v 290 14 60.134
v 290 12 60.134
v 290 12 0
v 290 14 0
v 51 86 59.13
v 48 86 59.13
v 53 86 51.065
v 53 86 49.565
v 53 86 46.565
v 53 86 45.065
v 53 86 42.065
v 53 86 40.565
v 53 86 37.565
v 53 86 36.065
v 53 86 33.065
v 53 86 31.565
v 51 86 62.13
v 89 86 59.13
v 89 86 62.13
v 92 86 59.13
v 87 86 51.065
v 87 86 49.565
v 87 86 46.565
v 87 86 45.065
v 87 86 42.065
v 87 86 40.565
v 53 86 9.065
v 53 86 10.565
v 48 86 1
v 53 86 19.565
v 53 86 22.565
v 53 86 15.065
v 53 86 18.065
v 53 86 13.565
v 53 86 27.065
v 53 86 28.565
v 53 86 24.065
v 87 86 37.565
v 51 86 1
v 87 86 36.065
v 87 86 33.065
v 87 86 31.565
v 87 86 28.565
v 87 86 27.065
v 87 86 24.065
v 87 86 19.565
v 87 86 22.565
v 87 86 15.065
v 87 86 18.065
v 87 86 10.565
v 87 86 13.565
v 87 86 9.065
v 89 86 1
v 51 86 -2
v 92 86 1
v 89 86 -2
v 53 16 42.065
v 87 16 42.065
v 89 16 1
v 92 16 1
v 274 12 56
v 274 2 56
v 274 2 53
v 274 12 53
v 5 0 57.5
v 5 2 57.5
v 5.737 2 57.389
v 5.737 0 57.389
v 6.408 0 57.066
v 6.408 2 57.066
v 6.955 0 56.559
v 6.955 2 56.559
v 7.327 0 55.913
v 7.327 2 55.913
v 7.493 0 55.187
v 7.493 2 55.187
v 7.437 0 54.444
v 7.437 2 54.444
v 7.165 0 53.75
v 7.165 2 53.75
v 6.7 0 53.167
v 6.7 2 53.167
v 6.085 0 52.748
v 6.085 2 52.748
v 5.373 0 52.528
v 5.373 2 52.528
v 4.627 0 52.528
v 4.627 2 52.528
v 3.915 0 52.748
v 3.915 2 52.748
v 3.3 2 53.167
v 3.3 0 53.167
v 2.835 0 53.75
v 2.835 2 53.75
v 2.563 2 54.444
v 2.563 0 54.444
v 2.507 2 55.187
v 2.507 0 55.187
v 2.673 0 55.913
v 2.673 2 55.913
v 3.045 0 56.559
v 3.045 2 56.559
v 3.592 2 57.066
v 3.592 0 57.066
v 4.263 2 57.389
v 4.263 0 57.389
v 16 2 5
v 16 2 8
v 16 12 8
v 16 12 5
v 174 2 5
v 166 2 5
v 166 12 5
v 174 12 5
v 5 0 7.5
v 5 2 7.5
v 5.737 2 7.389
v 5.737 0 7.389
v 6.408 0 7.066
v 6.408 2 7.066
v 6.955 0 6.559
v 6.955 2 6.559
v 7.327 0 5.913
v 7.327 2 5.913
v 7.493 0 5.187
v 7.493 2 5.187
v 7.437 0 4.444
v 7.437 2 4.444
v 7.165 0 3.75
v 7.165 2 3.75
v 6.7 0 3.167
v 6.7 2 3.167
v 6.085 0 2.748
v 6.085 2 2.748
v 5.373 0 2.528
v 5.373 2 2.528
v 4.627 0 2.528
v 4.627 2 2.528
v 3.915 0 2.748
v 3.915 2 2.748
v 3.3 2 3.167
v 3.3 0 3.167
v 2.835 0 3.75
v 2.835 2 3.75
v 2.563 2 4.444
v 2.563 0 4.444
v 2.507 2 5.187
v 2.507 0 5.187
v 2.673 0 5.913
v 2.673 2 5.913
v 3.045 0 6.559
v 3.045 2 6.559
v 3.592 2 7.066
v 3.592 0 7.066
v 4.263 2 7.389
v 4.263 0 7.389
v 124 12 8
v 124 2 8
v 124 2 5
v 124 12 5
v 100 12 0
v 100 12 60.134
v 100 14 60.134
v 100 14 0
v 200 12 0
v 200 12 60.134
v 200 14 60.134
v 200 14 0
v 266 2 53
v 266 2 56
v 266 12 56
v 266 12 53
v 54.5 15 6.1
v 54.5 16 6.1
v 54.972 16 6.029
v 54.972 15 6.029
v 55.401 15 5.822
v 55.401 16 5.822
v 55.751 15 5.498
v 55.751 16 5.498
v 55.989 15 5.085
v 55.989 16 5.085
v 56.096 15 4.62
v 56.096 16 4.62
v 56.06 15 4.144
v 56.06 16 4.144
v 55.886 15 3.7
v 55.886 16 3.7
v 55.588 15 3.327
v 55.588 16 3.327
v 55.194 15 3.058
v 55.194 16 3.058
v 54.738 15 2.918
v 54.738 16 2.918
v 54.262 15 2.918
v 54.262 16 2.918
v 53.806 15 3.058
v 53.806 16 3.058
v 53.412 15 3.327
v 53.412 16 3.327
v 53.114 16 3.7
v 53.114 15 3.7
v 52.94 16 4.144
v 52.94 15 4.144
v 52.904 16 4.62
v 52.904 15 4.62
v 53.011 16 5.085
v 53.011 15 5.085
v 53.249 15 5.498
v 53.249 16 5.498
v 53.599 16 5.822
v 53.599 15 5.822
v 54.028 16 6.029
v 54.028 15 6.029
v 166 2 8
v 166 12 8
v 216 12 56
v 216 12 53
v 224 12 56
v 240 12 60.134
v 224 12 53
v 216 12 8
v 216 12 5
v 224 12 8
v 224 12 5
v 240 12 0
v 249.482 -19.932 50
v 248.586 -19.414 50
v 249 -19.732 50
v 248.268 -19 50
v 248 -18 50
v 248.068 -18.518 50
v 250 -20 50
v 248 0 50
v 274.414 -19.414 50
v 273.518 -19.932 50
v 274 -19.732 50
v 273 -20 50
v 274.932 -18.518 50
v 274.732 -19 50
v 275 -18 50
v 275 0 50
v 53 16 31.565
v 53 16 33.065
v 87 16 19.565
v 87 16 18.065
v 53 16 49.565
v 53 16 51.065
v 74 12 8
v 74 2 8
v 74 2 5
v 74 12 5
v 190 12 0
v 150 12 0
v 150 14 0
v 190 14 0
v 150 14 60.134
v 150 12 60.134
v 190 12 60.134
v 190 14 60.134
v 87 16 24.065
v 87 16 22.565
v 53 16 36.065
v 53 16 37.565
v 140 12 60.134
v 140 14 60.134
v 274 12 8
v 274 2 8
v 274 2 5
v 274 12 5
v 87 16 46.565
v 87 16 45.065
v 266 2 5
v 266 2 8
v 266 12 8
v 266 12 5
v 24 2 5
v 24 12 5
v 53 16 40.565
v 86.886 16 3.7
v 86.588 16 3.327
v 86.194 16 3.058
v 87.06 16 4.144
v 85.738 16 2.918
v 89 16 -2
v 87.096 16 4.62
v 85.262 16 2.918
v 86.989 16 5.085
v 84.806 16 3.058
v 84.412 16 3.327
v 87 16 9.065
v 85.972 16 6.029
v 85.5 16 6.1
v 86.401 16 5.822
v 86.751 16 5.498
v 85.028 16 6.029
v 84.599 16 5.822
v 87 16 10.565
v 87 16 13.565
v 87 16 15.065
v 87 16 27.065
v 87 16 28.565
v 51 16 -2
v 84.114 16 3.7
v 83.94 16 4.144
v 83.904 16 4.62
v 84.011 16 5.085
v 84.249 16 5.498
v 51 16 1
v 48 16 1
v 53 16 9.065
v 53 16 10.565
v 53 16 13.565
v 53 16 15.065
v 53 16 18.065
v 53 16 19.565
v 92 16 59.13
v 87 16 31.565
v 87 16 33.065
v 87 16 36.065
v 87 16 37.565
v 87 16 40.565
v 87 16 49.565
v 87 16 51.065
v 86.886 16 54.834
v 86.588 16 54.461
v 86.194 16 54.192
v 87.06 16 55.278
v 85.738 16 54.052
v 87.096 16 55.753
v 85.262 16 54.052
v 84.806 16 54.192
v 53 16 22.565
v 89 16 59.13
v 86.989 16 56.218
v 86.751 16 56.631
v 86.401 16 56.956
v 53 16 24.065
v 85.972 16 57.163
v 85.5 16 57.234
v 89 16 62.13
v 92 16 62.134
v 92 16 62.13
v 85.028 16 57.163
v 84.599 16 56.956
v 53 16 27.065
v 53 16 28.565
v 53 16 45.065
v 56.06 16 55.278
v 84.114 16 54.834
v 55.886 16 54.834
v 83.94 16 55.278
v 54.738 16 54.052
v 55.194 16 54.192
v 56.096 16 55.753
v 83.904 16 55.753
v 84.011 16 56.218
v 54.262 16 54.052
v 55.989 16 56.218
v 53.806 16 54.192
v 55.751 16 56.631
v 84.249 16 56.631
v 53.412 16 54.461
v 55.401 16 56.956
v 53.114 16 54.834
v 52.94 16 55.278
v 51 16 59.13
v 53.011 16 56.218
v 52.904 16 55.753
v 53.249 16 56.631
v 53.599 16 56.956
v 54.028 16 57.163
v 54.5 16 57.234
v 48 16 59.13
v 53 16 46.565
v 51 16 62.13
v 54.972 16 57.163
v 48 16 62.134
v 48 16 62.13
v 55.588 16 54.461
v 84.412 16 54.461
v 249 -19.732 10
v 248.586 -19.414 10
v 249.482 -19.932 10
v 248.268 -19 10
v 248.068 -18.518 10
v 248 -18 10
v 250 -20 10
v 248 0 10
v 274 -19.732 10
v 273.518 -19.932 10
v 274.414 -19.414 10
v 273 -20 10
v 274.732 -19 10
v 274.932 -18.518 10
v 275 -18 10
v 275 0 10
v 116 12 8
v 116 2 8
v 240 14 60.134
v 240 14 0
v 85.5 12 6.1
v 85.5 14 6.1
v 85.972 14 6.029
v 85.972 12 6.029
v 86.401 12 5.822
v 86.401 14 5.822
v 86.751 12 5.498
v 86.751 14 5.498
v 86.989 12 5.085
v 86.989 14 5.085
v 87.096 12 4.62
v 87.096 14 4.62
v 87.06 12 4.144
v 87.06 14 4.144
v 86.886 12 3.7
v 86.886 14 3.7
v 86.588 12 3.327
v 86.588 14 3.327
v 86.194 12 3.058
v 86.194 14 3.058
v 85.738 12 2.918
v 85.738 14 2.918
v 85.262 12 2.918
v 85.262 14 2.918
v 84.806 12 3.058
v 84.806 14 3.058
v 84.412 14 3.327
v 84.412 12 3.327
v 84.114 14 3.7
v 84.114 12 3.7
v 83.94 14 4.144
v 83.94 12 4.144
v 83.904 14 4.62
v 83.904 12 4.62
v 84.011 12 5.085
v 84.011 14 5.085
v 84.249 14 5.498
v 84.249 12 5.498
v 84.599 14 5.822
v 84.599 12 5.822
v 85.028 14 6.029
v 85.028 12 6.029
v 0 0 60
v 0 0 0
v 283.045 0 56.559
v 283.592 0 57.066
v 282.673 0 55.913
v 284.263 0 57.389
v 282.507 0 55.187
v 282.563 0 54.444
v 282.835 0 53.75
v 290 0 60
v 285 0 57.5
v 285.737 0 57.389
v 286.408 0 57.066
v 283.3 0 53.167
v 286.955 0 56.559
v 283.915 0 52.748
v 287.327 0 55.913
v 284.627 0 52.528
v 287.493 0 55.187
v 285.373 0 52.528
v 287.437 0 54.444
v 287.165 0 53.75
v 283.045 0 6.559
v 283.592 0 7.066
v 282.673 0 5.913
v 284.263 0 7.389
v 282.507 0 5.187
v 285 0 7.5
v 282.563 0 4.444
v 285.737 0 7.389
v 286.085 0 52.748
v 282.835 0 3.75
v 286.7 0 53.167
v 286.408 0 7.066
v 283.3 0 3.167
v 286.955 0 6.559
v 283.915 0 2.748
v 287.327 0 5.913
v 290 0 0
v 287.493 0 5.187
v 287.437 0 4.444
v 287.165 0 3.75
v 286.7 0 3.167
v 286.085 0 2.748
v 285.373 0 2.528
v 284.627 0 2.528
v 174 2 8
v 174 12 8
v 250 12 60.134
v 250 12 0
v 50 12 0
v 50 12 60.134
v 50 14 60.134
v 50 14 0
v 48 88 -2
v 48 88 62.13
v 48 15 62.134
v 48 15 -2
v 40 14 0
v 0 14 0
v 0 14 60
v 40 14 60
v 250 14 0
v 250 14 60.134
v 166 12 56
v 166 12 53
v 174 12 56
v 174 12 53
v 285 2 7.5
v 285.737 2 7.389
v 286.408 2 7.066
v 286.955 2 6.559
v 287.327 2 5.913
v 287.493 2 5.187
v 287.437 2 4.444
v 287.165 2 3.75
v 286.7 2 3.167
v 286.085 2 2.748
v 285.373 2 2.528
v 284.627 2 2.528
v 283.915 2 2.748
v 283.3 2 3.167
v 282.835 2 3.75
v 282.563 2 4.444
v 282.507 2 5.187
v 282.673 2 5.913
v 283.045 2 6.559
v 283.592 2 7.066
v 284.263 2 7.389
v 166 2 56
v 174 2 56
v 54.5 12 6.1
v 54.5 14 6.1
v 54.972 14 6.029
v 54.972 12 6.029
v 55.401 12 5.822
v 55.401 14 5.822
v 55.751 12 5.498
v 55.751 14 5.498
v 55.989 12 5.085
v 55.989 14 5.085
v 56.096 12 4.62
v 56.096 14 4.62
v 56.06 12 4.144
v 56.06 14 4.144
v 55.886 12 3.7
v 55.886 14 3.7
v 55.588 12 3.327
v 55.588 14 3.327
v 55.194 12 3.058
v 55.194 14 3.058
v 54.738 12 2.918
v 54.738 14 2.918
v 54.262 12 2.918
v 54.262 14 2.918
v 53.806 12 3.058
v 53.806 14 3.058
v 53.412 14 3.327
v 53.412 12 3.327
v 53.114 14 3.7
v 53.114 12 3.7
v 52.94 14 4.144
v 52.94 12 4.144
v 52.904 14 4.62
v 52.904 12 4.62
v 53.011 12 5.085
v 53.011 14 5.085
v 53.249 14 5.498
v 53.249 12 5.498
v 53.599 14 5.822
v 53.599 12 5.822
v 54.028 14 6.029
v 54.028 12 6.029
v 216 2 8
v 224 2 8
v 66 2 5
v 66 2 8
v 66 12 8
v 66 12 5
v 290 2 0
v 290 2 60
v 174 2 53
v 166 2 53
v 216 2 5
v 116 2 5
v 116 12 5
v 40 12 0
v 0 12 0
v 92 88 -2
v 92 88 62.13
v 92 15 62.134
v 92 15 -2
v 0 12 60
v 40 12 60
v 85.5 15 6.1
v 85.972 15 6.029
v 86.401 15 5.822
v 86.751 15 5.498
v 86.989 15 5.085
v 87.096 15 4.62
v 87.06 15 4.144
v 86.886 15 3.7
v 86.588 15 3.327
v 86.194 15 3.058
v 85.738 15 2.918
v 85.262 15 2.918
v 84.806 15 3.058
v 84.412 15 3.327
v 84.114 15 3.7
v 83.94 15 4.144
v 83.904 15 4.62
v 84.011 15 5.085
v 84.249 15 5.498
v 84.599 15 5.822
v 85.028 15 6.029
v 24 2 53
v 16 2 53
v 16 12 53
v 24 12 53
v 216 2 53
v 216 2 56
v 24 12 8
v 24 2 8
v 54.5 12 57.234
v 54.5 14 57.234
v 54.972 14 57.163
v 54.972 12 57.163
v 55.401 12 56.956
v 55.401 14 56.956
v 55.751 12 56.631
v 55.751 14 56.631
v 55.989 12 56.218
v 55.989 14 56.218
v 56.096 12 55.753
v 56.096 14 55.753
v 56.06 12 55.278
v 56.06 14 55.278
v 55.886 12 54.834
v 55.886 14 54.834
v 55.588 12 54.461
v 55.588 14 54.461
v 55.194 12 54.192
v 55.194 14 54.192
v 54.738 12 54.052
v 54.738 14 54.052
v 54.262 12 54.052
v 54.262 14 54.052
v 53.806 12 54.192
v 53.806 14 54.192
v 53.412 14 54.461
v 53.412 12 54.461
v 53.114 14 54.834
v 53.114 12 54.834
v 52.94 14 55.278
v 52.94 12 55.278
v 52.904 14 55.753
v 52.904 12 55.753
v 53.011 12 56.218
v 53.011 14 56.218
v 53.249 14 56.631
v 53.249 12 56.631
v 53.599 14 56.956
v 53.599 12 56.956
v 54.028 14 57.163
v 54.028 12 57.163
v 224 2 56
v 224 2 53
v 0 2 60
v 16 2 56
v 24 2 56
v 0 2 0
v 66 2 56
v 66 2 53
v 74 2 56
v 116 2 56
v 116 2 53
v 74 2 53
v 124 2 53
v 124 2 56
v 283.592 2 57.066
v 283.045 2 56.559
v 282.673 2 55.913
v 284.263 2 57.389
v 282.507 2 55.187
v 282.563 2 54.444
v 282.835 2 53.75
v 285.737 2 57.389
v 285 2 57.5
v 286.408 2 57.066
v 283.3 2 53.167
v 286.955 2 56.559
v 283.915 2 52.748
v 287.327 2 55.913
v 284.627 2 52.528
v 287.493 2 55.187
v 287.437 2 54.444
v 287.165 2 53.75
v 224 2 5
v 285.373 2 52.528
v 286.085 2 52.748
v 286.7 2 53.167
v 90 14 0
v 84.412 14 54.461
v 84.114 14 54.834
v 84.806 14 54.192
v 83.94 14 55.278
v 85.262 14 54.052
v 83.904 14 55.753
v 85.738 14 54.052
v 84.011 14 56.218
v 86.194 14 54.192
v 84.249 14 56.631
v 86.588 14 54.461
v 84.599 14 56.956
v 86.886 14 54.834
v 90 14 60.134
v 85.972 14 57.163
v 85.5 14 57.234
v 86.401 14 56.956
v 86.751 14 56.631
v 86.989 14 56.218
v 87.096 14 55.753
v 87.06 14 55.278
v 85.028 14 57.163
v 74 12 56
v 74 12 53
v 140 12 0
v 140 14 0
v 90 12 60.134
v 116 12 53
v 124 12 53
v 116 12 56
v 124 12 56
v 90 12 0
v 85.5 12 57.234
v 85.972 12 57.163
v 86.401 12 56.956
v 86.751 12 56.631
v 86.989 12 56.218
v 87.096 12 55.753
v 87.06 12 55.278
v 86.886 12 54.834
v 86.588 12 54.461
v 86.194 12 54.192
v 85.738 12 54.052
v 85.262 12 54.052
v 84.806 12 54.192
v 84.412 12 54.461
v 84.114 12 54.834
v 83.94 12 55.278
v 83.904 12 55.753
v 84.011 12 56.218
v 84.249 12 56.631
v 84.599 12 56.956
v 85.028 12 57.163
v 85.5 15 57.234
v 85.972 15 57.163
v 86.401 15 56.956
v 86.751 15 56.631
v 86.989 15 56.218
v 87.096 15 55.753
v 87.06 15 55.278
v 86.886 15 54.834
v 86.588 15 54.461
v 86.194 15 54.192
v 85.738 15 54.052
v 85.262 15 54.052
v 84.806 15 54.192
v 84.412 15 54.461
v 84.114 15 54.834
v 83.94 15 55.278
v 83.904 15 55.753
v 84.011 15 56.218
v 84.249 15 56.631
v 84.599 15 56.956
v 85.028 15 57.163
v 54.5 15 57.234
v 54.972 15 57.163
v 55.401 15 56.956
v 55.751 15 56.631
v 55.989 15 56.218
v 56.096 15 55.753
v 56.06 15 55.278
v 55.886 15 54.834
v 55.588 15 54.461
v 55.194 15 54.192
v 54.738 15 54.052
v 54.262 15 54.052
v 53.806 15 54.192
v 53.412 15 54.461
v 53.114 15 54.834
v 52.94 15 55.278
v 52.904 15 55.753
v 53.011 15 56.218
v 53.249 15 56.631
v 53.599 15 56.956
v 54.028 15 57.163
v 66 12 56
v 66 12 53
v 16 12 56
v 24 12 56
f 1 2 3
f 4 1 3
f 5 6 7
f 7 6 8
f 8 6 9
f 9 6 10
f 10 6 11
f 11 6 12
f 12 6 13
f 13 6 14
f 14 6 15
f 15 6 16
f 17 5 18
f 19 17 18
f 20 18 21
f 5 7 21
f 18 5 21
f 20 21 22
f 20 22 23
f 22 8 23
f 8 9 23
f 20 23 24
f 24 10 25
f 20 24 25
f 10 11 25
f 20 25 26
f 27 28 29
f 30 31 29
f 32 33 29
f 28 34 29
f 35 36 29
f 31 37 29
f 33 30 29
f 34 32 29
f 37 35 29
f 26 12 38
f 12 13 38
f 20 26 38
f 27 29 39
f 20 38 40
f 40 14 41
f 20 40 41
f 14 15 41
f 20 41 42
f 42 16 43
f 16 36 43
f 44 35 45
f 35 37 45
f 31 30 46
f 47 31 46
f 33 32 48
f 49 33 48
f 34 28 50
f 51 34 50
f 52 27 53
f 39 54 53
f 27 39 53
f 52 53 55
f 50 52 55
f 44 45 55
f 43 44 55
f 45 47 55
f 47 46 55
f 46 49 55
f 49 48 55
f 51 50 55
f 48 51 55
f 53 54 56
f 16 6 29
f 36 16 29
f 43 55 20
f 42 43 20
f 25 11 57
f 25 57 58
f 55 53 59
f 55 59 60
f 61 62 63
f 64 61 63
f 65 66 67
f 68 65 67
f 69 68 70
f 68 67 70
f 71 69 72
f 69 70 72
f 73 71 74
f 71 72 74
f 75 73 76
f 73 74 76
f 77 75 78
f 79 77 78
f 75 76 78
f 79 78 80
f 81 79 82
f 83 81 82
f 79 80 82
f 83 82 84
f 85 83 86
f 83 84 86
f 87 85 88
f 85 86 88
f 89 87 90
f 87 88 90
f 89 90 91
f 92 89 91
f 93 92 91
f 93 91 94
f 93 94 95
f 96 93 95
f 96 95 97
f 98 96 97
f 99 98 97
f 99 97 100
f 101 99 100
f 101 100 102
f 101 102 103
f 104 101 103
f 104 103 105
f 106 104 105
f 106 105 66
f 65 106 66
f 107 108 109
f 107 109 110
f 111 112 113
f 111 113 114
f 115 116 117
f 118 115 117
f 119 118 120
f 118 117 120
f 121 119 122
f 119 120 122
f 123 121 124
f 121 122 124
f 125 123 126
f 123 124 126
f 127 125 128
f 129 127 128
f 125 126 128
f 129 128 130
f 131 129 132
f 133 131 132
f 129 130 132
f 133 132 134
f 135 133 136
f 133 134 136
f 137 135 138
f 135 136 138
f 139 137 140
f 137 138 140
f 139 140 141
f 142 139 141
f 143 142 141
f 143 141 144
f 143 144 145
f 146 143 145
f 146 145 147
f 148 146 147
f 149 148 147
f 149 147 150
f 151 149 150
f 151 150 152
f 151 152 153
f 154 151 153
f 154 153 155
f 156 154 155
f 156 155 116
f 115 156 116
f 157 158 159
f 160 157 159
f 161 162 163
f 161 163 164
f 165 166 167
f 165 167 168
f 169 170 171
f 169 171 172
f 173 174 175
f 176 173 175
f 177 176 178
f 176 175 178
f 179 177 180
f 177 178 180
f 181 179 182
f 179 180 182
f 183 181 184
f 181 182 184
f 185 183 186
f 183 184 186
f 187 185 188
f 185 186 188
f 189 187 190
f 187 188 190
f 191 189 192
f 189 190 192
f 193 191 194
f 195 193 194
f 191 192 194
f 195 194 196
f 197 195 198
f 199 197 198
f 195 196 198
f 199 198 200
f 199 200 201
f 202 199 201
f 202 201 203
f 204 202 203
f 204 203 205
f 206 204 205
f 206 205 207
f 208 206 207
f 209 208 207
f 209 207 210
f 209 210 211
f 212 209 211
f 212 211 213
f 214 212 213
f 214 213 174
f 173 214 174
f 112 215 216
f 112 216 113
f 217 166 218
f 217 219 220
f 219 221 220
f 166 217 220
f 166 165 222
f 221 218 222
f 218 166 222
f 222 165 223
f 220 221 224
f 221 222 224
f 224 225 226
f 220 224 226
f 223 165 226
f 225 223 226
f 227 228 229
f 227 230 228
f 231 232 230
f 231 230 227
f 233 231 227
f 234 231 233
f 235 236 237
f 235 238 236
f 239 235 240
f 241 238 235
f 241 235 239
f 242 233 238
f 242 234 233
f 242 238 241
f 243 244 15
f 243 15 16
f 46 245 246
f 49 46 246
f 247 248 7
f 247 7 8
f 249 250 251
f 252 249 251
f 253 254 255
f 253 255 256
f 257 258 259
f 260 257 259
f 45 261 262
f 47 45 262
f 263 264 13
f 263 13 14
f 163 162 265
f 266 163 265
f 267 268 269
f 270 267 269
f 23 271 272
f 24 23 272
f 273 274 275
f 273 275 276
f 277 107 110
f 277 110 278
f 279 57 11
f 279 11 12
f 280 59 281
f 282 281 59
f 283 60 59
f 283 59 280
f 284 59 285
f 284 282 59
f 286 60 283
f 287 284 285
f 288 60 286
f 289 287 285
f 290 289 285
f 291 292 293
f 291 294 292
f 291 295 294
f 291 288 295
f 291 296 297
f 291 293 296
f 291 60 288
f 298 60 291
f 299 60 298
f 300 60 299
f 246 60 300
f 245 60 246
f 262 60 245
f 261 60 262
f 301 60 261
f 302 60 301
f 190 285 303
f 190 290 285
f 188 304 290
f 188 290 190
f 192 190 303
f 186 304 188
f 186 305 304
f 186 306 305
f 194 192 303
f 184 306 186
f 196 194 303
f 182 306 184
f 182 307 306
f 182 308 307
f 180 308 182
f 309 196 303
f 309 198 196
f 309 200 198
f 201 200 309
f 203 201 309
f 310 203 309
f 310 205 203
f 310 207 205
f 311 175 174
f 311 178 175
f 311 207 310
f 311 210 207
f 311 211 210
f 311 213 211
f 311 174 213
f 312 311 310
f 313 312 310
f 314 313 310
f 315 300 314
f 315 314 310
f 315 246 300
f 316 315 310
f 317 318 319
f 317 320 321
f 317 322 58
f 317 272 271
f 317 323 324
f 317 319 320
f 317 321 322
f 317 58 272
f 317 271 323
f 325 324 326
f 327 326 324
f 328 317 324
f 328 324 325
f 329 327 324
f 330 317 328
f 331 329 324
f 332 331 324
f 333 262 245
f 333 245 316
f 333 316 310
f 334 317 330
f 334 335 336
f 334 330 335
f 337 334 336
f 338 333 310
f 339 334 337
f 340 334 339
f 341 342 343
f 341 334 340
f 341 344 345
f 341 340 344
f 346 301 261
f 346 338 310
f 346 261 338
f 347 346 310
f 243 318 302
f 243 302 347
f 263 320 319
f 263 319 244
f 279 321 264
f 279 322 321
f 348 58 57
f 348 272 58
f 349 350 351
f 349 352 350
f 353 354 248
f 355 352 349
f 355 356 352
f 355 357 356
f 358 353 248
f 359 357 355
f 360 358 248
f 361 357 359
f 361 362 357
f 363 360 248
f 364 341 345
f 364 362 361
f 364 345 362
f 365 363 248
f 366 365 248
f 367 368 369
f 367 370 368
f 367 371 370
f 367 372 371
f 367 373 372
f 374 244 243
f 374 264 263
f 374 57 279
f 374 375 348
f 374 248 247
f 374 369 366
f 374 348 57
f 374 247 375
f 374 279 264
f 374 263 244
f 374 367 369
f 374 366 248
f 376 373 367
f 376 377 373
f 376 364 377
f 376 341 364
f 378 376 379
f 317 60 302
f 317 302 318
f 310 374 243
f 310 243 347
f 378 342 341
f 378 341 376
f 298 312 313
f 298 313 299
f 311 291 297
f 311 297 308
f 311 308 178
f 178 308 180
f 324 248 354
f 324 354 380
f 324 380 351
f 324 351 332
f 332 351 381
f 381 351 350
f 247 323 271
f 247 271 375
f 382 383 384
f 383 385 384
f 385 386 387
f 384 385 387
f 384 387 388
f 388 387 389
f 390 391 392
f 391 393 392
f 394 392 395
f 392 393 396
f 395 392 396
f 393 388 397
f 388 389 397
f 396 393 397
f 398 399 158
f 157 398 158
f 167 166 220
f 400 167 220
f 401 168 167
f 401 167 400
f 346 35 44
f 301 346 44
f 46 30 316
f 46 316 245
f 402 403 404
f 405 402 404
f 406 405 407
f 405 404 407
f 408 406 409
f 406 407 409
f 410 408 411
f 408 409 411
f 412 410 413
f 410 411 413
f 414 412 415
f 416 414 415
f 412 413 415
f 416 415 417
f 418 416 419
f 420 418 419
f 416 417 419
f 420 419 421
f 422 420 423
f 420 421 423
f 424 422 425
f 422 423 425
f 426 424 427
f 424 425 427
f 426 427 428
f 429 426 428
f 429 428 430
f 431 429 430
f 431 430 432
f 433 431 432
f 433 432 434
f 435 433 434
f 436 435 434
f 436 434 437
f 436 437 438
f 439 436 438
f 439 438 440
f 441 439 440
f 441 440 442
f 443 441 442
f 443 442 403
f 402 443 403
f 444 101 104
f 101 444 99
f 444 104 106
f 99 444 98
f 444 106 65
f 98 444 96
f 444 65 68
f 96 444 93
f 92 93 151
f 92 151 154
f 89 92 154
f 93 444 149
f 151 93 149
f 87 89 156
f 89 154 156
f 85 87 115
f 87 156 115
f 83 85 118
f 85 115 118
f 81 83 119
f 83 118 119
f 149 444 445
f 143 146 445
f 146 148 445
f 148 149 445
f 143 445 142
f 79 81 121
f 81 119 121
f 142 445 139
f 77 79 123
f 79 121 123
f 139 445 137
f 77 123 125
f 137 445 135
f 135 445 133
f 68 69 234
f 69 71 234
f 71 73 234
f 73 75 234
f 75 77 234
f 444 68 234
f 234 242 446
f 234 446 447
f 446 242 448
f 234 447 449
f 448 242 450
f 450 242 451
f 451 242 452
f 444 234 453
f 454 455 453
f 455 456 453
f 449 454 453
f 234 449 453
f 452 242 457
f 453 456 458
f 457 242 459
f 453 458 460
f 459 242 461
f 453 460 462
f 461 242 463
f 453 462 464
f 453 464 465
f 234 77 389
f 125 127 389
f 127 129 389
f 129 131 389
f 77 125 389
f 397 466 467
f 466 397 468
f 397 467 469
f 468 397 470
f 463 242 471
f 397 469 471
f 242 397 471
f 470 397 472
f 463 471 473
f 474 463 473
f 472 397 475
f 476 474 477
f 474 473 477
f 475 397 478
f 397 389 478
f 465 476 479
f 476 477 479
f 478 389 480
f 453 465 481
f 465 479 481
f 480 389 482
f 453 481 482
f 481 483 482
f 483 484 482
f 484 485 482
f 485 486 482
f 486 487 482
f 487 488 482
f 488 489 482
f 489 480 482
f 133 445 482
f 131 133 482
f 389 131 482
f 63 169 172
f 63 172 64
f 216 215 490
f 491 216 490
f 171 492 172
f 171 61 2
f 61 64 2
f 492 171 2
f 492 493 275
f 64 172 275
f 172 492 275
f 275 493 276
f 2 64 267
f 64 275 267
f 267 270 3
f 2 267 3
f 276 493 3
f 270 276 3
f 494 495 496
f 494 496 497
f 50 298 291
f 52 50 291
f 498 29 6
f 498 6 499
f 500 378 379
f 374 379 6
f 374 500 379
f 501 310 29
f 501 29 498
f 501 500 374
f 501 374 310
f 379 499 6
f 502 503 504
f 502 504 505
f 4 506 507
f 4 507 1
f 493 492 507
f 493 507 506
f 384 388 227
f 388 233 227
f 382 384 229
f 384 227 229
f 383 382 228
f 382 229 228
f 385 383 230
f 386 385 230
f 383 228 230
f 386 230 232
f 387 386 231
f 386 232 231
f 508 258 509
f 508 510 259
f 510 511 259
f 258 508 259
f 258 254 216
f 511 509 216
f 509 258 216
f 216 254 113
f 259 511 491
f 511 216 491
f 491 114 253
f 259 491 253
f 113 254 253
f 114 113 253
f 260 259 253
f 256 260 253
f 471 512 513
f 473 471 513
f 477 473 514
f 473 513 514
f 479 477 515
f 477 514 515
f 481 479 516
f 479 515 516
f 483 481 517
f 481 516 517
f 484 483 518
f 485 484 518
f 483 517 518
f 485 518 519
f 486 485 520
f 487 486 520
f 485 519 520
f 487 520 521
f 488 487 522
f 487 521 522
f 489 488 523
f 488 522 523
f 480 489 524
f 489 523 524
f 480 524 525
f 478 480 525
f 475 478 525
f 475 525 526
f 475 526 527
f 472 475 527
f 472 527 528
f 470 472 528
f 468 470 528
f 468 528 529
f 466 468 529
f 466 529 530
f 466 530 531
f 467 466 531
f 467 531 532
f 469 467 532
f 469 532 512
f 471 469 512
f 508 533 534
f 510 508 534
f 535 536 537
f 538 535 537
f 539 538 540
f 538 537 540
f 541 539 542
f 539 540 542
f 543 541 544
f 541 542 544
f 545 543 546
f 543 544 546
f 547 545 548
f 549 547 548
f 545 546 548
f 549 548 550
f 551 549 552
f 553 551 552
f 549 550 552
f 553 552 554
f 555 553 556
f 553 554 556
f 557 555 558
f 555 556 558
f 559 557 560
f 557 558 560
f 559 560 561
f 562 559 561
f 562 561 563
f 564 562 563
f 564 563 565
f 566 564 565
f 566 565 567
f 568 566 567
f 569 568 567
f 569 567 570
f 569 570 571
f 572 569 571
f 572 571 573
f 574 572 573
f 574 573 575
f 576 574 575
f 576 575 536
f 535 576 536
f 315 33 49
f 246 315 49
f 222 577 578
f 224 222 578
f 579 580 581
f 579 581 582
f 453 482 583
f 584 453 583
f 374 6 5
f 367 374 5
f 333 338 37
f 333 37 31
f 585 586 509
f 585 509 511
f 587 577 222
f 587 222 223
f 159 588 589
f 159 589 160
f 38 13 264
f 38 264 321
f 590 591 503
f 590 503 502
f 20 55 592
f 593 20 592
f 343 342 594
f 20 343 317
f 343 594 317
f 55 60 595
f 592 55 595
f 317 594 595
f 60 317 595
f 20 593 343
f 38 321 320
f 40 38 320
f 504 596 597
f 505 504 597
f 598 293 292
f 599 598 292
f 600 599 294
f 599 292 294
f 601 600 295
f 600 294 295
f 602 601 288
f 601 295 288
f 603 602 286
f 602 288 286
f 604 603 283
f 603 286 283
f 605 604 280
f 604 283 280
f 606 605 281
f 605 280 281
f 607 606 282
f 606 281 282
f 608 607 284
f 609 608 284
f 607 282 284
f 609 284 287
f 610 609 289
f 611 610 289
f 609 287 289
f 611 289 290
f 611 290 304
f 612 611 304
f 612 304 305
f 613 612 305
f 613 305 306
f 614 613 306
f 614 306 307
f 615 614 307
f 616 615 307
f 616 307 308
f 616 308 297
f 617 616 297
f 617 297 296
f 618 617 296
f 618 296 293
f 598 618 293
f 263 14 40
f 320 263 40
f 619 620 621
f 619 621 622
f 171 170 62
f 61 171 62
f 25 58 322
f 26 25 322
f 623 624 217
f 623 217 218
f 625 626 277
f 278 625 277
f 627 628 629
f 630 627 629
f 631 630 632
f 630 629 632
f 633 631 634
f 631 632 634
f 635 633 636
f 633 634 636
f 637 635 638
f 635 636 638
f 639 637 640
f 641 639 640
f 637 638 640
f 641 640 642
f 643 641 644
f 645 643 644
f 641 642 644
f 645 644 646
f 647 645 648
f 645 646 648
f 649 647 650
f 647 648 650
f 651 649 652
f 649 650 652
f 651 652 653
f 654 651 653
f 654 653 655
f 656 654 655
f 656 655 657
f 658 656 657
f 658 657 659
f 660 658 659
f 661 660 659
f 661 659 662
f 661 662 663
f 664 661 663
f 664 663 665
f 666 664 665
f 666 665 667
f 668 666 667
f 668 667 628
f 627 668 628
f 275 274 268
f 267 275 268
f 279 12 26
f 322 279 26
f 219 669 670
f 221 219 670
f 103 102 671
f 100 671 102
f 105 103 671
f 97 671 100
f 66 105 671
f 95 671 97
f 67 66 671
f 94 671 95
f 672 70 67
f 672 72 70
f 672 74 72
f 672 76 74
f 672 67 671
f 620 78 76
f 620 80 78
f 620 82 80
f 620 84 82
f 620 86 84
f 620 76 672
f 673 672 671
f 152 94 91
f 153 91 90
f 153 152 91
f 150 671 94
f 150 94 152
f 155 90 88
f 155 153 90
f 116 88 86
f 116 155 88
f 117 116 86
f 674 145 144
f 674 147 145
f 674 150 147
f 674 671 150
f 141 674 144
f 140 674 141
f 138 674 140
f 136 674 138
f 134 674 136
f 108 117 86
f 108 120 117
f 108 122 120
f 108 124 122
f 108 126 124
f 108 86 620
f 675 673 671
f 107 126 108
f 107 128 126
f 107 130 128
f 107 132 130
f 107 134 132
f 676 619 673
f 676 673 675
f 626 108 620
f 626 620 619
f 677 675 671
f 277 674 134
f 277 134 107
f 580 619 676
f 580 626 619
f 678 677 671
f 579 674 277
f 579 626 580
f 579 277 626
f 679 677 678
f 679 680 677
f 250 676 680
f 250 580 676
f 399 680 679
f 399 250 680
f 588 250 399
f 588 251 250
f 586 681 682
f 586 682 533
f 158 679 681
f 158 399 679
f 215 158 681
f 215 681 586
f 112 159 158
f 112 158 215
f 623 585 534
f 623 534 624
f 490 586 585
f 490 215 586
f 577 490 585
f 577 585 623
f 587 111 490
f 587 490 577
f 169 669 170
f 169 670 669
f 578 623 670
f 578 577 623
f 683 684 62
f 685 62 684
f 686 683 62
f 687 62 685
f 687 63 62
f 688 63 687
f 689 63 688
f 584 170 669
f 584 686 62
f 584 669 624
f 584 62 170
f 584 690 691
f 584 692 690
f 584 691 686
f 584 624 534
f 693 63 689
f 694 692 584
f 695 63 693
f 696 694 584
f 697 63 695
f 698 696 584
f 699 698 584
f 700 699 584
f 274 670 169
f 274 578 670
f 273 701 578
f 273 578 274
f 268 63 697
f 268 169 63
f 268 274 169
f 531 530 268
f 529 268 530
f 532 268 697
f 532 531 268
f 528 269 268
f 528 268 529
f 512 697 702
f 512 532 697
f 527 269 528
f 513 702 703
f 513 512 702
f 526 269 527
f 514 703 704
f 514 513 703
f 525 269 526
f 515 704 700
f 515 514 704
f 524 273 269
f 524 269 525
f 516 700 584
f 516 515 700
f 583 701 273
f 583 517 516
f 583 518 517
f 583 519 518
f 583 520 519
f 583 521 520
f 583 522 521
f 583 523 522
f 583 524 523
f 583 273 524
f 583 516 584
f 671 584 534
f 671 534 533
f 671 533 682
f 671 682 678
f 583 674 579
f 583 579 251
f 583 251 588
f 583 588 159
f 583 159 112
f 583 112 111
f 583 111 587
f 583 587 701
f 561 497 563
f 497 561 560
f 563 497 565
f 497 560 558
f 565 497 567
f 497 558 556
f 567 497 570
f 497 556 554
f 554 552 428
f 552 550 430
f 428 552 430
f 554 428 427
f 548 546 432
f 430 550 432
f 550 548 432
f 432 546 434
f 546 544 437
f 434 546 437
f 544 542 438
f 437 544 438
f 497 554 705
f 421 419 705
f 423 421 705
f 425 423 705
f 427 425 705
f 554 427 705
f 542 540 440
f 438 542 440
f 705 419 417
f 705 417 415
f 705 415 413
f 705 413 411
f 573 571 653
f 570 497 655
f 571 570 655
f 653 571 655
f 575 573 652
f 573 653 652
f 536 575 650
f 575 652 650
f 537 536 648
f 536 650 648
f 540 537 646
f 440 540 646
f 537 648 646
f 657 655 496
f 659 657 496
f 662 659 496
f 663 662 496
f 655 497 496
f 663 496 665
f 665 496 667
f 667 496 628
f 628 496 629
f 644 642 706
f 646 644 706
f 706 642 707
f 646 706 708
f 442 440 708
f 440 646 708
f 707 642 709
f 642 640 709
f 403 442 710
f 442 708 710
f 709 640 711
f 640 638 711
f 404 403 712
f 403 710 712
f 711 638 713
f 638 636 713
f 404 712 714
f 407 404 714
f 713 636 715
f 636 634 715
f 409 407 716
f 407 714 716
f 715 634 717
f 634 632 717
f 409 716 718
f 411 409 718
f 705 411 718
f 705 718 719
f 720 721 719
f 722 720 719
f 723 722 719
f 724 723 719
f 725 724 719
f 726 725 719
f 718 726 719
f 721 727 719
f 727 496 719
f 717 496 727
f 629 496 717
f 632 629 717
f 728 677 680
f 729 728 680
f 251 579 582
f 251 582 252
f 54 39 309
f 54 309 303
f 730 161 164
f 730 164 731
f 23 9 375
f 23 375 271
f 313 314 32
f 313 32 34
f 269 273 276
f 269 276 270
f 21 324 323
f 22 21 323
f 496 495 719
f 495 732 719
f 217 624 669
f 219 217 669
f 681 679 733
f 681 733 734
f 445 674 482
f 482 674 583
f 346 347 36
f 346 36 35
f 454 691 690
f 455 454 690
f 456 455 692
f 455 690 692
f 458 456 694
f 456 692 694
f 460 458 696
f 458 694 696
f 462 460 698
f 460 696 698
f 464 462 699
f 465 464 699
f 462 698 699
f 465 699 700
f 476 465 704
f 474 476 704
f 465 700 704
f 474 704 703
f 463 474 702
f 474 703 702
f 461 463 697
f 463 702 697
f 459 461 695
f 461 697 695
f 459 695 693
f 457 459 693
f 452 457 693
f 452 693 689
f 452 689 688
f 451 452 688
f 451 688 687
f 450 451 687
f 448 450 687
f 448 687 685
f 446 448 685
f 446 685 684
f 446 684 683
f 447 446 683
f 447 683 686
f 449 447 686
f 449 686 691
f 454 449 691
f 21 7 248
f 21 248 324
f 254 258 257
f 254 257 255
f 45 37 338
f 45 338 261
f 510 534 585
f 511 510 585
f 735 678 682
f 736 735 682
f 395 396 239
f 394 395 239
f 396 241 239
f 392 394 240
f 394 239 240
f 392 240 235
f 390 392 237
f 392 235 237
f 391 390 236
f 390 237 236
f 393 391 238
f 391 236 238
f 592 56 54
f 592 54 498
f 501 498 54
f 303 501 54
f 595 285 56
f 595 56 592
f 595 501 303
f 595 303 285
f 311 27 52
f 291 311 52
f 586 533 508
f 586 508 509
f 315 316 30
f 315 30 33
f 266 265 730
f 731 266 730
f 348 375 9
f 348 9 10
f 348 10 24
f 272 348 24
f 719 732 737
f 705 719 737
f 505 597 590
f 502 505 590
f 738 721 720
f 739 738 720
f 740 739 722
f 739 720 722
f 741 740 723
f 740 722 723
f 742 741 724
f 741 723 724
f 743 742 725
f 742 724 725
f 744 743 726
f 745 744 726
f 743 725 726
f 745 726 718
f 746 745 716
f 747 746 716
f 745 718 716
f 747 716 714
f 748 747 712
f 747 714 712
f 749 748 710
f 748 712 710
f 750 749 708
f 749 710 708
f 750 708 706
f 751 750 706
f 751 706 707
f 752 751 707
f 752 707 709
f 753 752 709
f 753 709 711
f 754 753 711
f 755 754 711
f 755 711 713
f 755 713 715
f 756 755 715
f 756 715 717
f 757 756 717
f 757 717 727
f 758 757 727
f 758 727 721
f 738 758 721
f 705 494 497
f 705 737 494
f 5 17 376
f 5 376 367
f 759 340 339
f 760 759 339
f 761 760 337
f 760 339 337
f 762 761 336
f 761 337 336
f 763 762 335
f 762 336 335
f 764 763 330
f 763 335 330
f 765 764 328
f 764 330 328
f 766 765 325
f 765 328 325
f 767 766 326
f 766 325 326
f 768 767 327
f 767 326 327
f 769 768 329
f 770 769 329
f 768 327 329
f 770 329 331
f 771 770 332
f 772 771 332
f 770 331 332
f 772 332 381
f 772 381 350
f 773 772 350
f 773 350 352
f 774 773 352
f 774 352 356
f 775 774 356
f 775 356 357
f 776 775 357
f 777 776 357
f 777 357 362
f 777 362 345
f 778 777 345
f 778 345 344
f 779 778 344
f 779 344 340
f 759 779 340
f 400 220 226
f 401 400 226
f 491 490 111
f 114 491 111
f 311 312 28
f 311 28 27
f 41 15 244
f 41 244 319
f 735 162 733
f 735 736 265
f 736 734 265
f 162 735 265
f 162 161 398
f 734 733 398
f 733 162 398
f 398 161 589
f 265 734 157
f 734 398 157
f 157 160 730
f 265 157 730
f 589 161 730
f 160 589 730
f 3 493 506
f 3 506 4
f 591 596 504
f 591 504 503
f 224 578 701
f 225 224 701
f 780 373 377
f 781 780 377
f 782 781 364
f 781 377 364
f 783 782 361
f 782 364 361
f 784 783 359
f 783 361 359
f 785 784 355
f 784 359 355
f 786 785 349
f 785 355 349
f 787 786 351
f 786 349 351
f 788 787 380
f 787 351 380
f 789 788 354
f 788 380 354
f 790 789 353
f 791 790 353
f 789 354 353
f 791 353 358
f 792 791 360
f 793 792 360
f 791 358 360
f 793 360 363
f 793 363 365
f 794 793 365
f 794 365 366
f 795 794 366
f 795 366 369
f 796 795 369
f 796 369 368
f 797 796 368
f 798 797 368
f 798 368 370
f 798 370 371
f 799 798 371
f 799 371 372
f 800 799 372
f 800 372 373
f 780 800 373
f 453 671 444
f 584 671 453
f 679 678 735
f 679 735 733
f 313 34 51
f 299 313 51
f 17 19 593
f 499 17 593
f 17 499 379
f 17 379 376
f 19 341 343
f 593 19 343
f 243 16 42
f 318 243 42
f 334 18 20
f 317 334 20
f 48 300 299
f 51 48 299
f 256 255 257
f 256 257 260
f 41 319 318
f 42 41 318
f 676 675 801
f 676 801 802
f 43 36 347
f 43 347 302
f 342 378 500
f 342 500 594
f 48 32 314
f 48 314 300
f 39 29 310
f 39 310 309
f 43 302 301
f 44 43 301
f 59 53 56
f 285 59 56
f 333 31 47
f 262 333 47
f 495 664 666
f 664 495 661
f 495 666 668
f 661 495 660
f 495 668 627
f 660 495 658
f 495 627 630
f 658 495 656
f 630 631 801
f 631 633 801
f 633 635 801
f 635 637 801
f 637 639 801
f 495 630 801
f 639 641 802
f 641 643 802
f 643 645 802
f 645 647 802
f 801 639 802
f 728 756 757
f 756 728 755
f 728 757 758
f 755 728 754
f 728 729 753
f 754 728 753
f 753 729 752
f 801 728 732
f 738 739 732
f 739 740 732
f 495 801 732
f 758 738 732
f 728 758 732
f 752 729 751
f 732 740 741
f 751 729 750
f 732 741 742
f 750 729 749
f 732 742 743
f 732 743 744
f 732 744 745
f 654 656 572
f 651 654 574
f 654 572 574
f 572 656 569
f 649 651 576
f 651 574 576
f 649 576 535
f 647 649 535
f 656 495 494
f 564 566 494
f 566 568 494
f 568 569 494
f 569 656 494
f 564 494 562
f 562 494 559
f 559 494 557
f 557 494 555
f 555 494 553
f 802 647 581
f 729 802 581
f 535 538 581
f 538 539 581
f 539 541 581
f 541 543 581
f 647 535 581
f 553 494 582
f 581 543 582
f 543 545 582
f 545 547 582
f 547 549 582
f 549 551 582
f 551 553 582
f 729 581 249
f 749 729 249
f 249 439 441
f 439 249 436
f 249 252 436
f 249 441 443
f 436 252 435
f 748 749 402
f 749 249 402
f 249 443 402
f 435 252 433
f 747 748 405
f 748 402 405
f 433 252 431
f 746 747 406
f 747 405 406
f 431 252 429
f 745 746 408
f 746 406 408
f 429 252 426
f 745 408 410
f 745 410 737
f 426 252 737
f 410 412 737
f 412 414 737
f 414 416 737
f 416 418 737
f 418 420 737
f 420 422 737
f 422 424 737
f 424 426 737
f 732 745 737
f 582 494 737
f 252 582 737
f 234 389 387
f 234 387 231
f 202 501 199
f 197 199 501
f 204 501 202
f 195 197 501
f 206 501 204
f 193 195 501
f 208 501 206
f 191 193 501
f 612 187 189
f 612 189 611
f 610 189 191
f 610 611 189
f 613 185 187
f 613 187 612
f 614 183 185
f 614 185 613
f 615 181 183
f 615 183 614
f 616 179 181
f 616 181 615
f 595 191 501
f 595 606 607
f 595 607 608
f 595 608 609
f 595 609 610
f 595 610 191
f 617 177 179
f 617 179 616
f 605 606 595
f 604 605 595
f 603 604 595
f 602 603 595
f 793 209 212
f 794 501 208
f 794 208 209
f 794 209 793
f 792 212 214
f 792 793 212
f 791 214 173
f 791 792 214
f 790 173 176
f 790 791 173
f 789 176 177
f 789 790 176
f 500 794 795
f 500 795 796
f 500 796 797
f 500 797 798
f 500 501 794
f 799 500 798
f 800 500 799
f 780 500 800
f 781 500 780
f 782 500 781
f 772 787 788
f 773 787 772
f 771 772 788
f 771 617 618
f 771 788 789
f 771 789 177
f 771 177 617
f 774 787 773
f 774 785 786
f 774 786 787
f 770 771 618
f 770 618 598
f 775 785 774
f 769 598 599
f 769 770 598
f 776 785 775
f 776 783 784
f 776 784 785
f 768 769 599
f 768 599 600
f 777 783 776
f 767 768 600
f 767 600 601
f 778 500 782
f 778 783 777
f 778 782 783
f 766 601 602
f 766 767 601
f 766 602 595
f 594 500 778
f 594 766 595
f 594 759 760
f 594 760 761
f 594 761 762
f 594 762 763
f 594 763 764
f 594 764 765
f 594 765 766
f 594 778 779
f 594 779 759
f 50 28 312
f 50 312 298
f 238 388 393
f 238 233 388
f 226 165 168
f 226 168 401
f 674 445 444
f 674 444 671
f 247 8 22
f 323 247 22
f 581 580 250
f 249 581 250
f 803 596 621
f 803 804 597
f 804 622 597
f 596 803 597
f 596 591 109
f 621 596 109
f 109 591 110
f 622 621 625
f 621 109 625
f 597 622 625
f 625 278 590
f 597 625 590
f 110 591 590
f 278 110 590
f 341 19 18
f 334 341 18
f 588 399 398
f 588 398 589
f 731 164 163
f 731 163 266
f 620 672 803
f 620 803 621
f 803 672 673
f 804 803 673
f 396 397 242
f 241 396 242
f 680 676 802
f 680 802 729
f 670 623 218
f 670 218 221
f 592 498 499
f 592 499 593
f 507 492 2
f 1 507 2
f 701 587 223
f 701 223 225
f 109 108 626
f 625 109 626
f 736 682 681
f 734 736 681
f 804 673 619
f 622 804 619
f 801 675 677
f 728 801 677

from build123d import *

# Parameters (mm, degrees)
SKIZZE1_W                        = 290
SKIZZE1_H                        = 2
AUFSATZ_LINEAR_AUSTRAGEN1_DEPTH  = 60
SKIZZE2_R                        = 2.5
SCHNITT_LINEAR_AUSTRAGEN1_DEPTH  = 60
SKIZZE3_W                        = 8
SKIZZE3_H                        = 3
AUFSATZ_LINEAR_AUSTRAGEN2_DEPTH  = 10
SKIZZE4_W                        = 40
SKIZZE4_H                        = 60
SKIZZE4_H_2                      = 60.133820733
AUFSATZ_LINEAR_AUSTRAGEN3_DEPTH  = 2
SKIZZE6_W                        = 40
SKIZZE6_H                        = 60.133820733
AUFSATZ_LINEAR_AUSTRAGEN4_DEPTH  = 2
SKIZZE7_W                        = 60.133820733
SKIZZE7_H                        = 2
AUFSATZ_LINEAR_AUSTRAGEN5_DEPTH  = 2
SKIZZE8_W                        = 60.133820733
SKIZZE8_H                        = 2
AUFSATZ_LINEAR_AUSTRAGEN6_DEPTH  = 2
SKIZZE9_W                        = 44
SKIZZE9_H                        = 2
AUFSATZ_LINEAR_AUSTRAGEN7_DEPTH  = 2
SKIZZE10_W                       = 44
SKIZZE10_H                       = 2
AUFSATZ_LINEAR_AUSTRAGEN8_DEPTH  = 2
SKIZZE11_W                       = 34
SKIZZE11_H                       = 1.5
AUFSATZ_LINEAR_AUSTRAGEN9_DEPTH  = 70
SKIZZE12_W                       = 44
SKIZZE12_H                       = 1
SCHNITT_LINEAR_AUSTRAGEN3_DEPTH  = 70
SKIZZE13_W                       = 44
SKIZZE13_H                       = 64.13
AUFSATZ_LINEAR_AUSTRAGEN10_DEPTH = 2
SKIZZE14_W                       = 3
SKIZZE14_H                       = 3
AUFSATZ_LINEAR_AUSTRAGEN11_DEPTH = 72
SKIZZE15_W                       = 27
SKIZZE15_H                       = 40
AUFSATZ_LINEAR_AUSTRAGEN12_DEPTH = 20
VERRUNDUNG2_R                    = 2
VERRUNDUNG3_R                    = 2
SKIZZE18_R                       = 1.6
SCHNITT_LINEAR_AUSTRAGEN4_DEPTH  = 10


with BuildPart() as part:
    # Skizze1 → Aufsatz-Linear austragen1 (new body)
    with BuildSketch(Plane.XY):
        with Locations((145, 1)):
            Rectangle(SKIZZE1_W, SKIZZE1_H)
    extrude(amount=AUFSATZ_LINEAR_AUSTRAGEN1_DEPTH)

    # Skizze2 → Schnitt-Linear austragen1 (cut)
    with BuildSketch(Plane(origin=(0, 2, 0), x_dir=(1, 0, 0), z_dir=(0, 1, 0))):
        with Locations(Location((5, -5, 0), (0, 0, 270))):
            Circle(SKIZZE2_R)
        with Locations(Location((5, -55, 0), (0, 0, 270))):
            Circle(SKIZZE2_R)
        with Locations(Location((285, -55, 0), (0, 0, 270))):
            Circle(SKIZZE2_R)
        with Locations(Location((285, -5, 0), (0, 0, 270))):
            Circle(SKIZZE2_R)
    extrude(amount=-SCHNITT_LINEAR_AUSTRAGEN1_DEPTH, mode=Mode.SUBTRACT)

    # Skizze3 → Aufsatz-Linear austragen2 (add)
    with BuildSketch(Plane(origin=(0, 2, 0), x_dir=(1, 0, 0), z_dir=(0, 1, 0))):
        with Locations((20, -6.5)):
            Rectangle(SKIZZE3_W, SKIZZE3_H)
        with Locations((70, -6.5)):
            Rectangle(SKIZZE3_W, SKIZZE3_H)
        with Locations((120, -6.5)):
            Rectangle(SKIZZE3_W, SKIZZE3_H)
        with Locations((170, -6.5)):
            Rectangle(SKIZZE3_W, SKIZZE3_H)
        with Locations((220, -6.5)):
            Rectangle(SKIZZE3_W, SKIZZE3_H)
        with Locations((270, -6.5)):
            Rectangle(SKIZZE3_W, SKIZZE3_H)
        with Locations((270, -54.5)):
            Rectangle(SKIZZE3_W, SKIZZE3_H)
        with Locations((220, -54.5)):
            Rectangle(SKIZZE3_W, SKIZZE3_H)
        with Locations((170, -54.5)):
            Rectangle(SKIZZE3_W, SKIZZE3_H)
        with Locations((120, -54.5)):
            Rectangle(SKIZZE3_W, SKIZZE3_H)
        with Locations((70, -54.5)):
            Rectangle(SKIZZE3_W, SKIZZE3_H)
        with Locations((20, -54.5)):
            Rectangle(SKIZZE3_W, SKIZZE3_H)
    extrude(amount=AUFSATZ_LINEAR_AUSTRAGEN2_DEPTH)

    # Skizze4 → Aufsatz-Linear austragen3 (add)
    with BuildSketch(Plane(origin=(0, 12, 0), x_dir=(1, 0, 0), z_dir=(0, 1, 0))):
        with Locations((20, -30)):
            Rectangle(SKIZZE4_W, SKIZZE4_H)
        with Locations((70, -30.066910367)):
            Rectangle(SKIZZE4_W, SKIZZE4_H_2)
        with Locations((120, -30.066910367)):
            Rectangle(SKIZZE4_W, SKIZZE4_H_2)
        with Locations((170, -30.066910367)):
            Rectangle(SKIZZE4_W, SKIZZE4_H_2)
        with Locations((220, -30.066910367)):
            Rectangle(SKIZZE4_W, SKIZZE4_H_2)
        with Locations((270, -30.066910367)):
            Rectangle(SKIZZE4_W, SKIZZE4_H_2)
    extrude(amount=AUFSATZ_LINEAR_AUSTRAGEN3_DEPTH)

    # Skizze6 → Aufsatz-Linear austragen4 (add)
    with BuildSketch(Plane(origin=(0, 14, 0), x_dir=(1, 0, 0), z_dir=(0, 1, 0))):
        with Locations((70, -30.066910367)):
            Rectangle(SKIZZE6_W, SKIZZE6_H)
    extrude(amount=AUFSATZ_LINEAR_AUSTRAGEN4_DEPTH)

    # Skizze7 → Aufsatz-Linear austragen5 (add)
    with BuildSketch(Plane(origin=(90, 0, 0), x_dir=(0, 0, -1), z_dir=(1, 0, 0))):
        with Locations((-30.066910367, 15)):
            Rectangle(SKIZZE7_W, SKIZZE7_H)
    extrude(amount=AUFSATZ_LINEAR_AUSTRAGEN5_DEPTH)

    # Skizze8 → Aufsatz-Linear austragen6 (add)
    with BuildSketch(Plane.ZY.offset(-50)):
        with Locations((30.066910367, 15)):
            Rectangle(SKIZZE8_W, SKIZZE8_H)
    extrude(amount=AUFSATZ_LINEAR_AUSTRAGEN6_DEPTH)

    # Skizze9 → Aufsatz-Linear austragen7 (add)
    with BuildSketch(Plane.XY.offset(60.133820733)):
        with Locations((70, 15)):
            Rectangle(SKIZZE9_W, SKIZZE9_H)
    extrude(amount=AUFSATZ_LINEAR_AUSTRAGEN7_DEPTH)

    # Skizze10 → Aufsatz-Linear austragen8 (add)
    with BuildSketch(Plane(origin=(0, 0, 0), x_dir=(-1, 0, 0), z_dir=(0, 0, -1))):
        with Locations((-70, 15)):
            Rectangle(SKIZZE10_W, SKIZZE10_H)
    extrude(amount=AUFSATZ_LINEAR_AUSTRAGEN8_DEPTH)

    # Skizze11 → Aufsatz-Linear austragen9 (add)
    with BuildSketch(Plane(origin=(0, 16, 0), x_dir=(1, 0, 0), z_dir=(0, 1, 0))):
        with Locations((70, -9.815)):
            Rectangle(SKIZZE11_W, SKIZZE11_H)
        with Locations((70, -14.315)):
            Rectangle(SKIZZE11_W, SKIZZE11_H)
        with Locations((70, -18.815)):
            Rectangle(SKIZZE11_W, SKIZZE11_H)
        with Locations((70, -23.315)):
            Rectangle(SKIZZE11_W, SKIZZE11_H)
        with Locations((70, -27.815)):
            Rectangle(SKIZZE11_W, SKIZZE11_H)
        with Locations((70, -32.315)):
            Rectangle(SKIZZE11_W, SKIZZE11_H)
        with Locations((70, -36.815)):
            Rectangle(SKIZZE11_W, SKIZZE11_H)
        with Locations((70, -41.315)):
            Rectangle(SKIZZE11_W, SKIZZE11_H)
        with Locations((70, -45.815)):
            Rectangle(SKIZZE11_W, SKIZZE11_H)
        with Locations((70, -50.315)):
            Rectangle(SKIZZE11_W, SKIZZE11_H)
    extrude(amount=AUFSATZ_LINEAR_AUSTRAGEN9_DEPTH)

    # Skizze12 → Schnitt-Linear austragen3 (cut)
    with BuildSketch(Plane.XY.offset(62.133820733)):
        with Locations((70, 14.5)):
            Rectangle(SKIZZE12_W, SKIZZE12_H)
    extrude(amount=-SCHNITT_LINEAR_AUSTRAGEN3_DEPTH, mode=Mode.SUBTRACT)


with BuildPart() as schnitt_linear_austragen3_piece_1:
    # of the separate pieces the step leaves, piece 1, a body of its own (schnitt_linear_austragen3_pieces)
    add(part.part.solids().sort_by_distance((0, 12, 0))[0])

    # Skizze15 → Aufsatz-Linear austragen12 (add)
    with BuildSketch(Plane.XZ):
        with Locations((261.5, 30)):
            Rectangle(SKIZZE15_W, SKIZZE15_H)
    extrude(amount=AUFSATZ_LINEAR_AUSTRAGEN12_DEPTH)

    # Verrundung2
    verrundung2_edges = [schnitt_linear_austragen3_piece_1.edges().sort_by_distance(p)[0] for p in [
        (275, -20, 30),
    ]]
    fillet(verrundung2_edges, radius=VERRUNDUNG2_R)

    # Verrundung3
    verrundung3_edges = [schnitt_linear_austragen3_piece_1.edges().sort_by_distance(p)[0] for p in [
        (248, -20, 30),
    ]]
    fillet(verrundung3_edges, radius=VERRUNDUNG3_R)


with BuildPart() as schnitt_linear_austragen3_piece_2:
    # of the separate pieces the step leaves, piece 2, a body of its own (schnitt_linear_austragen3_pieces)
    add(part.part.solids().sort_by_distance((92, 15, -2))[0])

    # Skizze13 → Aufsatz-Linear austragen10 (add)
    with BuildSketch(Plane(origin=(0, 86, 0), x_dir=(1, 0, 0), z_dir=(0, 1, 0))):
        with Locations((70, -30.065)):
            Rectangle(SKIZZE13_W, SKIZZE13_H)
    extrude(amount=AUFSATZ_LINEAR_AUSTRAGEN10_DEPTH)

    # Skizze14 → Aufsatz-Linear austragen11 (add)
    with BuildSketch(Plane(origin=(0, 88, 0), x_dir=(1, 0, 0), z_dir=(0, 1, 0))):
        with Locations((49.5, 0.5)):
            Rectangle(SKIZZE14_W, SKIZZE14_H)
        with Locations((90.5, 0.5)):
            Rectangle(SKIZZE14_W, SKIZZE14_H)
        with Locations((90.5, -60.63)):
            Rectangle(SKIZZE14_W, SKIZZE14_H)
        with Locations((49.5, -60.63)):
            Rectangle(SKIZZE14_W, SKIZZE14_H)
    extrude(amount=-AUFSATZ_LINEAR_AUSTRAGEN11_DEPTH)


with BuildPart() as schnitt_linear_austragen4_tool:
    # Skizze18 → Schnitt-Linear austragen4 (new body)
    with BuildSketch(Plane(origin=(0, 16, 0), x_dir=(1, 0, 0), z_dir=(0, 1, 0))):
        with Locations(Location((54.5, -4.5, 0), (0, 0, 270))):
            Circle(SKIZZE18_R)
        with Locations(Location((54.5, -55.633820733, 0), (0, 0, 270))):
            Circle(SKIZZE18_R)
        with Locations(Location((85.5, -55.633820733, 0), (0, 0, 270))):
            Circle(SKIZZE18_R)
        with Locations(Location((85.5, -4.5, 0), (0, 0, 270))):
            Circle(SKIZZE18_R)
    extrude(amount=-SCHNITT_LINEAR_AUSTRAGEN4_DEPTH)


with BuildPart() as schnitt_linear_austragen3_piece_1_1:
    add(schnitt_linear_austragen3_piece_1.part)

    # Schnitt-Linear austragen4: cut by schnitt_linear_austragen4_tool
    add(schnitt_linear_austragen4_tool.part, mode=Mode.SUBTRACT)


with BuildPart() as schnitt_linear_austragen3_piece_2_1:
    add(schnitt_linear_austragen3_piece_2.part)

    # Schnitt-Linear austragen4: cut by schnitt_linear_austragen4_tool
    add(schnitt_linear_austragen4_tool.part, mode=Mode.SUBTRACT)


solid = Compound([schnitt_linear_austragen3_piece_1_1.part, schnitt_linear_austragen3_piece_2_1.part])
